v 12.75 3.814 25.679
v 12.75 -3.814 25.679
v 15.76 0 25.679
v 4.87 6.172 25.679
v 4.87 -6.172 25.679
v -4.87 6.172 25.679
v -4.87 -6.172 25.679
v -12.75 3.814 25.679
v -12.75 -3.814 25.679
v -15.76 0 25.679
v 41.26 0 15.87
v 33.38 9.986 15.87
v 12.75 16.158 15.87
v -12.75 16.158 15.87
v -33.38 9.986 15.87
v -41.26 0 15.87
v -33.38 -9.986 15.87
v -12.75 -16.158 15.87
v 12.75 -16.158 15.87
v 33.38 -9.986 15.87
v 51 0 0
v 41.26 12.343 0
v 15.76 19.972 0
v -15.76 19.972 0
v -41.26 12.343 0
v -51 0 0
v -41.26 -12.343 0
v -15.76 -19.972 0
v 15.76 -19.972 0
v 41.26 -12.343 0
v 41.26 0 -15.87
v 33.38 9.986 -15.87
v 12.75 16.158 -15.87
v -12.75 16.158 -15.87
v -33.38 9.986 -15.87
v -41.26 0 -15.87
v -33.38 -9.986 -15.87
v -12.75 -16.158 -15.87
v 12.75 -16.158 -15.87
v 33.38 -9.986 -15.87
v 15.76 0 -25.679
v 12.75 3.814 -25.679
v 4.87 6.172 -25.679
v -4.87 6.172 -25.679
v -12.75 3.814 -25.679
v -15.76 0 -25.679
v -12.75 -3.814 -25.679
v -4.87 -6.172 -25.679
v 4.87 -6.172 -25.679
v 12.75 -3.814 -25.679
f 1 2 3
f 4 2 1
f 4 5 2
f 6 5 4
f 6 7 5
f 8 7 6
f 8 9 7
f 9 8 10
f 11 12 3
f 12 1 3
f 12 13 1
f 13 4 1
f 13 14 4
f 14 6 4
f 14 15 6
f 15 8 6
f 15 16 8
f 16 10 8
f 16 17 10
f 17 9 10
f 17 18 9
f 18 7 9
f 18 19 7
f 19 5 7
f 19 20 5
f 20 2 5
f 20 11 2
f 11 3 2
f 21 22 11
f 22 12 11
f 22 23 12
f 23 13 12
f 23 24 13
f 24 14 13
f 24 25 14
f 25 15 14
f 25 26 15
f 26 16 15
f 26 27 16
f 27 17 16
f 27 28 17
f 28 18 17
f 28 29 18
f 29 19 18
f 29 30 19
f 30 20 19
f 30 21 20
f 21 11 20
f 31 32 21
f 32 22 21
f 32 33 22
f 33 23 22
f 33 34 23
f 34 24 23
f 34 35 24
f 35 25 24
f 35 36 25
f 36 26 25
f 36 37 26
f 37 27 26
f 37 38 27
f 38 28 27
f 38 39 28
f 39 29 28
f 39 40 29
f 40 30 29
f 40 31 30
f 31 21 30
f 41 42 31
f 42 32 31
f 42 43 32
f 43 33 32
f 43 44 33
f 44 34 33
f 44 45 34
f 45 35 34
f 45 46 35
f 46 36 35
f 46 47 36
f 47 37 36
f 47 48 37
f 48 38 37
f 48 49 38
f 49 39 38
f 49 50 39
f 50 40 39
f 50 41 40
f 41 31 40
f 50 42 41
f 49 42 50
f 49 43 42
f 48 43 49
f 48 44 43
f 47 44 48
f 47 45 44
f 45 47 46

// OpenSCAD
// Generated by SolidPython 1.0.1 on 2020-07-29 00:46:52


scale(v = [17, 7, 9]) {
	sphere(r = 3);
}
/***********************************************
*********      SolidPython code:      **********
************************************************
 
# import packages: SolidPython
from solid import *
from solid.utils import *
from itertools import chain, combinations, permutations


class Resize:

    def __init__(self, scad_file):
        self.scad_file = scad_file
        #self.scad_file = import_scad(scad_file)
        # cone/cylinder param:
        self.r1 = 0
        self.r2 = 0
        self.h = 0
        # rectangular prism param:
        self.w = 0
        self.l = 0
        # ellipse param:
        self.r = 0

    # import OpenScad code (file name corresponds to shape)


    # classify shape + parameters
    def assign(self, param1, param2, param3):
        if self.scad_file == 'cone.scad':
            self.r1 = param1
            self.r2 = param2
            self.h = param3
        elif self.scad_file == 'cylinder.scad':
            self.r1 = param1
            self.r2 = param2
            self.h = param3
        elif self.scad_file == 'rectangularPrism.scad':
            self.h = param1
            self.l = param2
            self.w = param3
        else:
            self.r = param1
            self.h = param2

    # resize parameters
    def iterate(self):
        x = range(3, 20, 2)
        i = 1
        if self.scad_file == 'cone.scad':
            tempList = list(permutations(x, 2))
            for temp in tempList:
                param1 = temp[0]
                param2 = temp[1]
                filepath = 'produced_scad_files/' + 'cone' + str(param1) + '_' + str(param2) + '_' + '.scad'
                scad_render_to_file(cylinder(h=param1, r1=param2, r2=0), filepath)

        elif self.scad_file == 'cylinder.scad':
            tempList = list(permutations(x, 3))
            for temp in tempList:
                param1 = temp[0]
                param2 = temp[1]
                filepath = 'produced_scad_files/' + 'cylinder' + str(param1) + '_' + str(param2) + '_' + '.scad'
                scad_render_to_file(cylinder(h=param1, r1=param2, r2=param2), filepath)

        elif self.scad_file == 'rectangularPrism.scad':
            tempList = list(permutations(x, 3))
            for temp in tempList:
                param1 = temp[0]
                param2 = temp[1]
                param3 = temp[2]
                filepath = 'produced_scad_files/' + 'rectangularPrism' + str(param1) + '_' + str(param2) + '_' + str(
                    param3) + '.scad'
                scad_render_to_file(cube(size=(param1, param2, param3)), filepath)

        elif self.scad_file == 'ellipse.scad':
            tempList = list(permutations(x, 4))
            for temp in tempList:
                param1 = temp[0]
                param2 = temp[1]
                param3 = temp[2]
                param4 = temp[3]
                filepath = 'produced_scad_files/' + 'ellipse' + str(param1) + '_' + str(param2) + '_' + str(param3) + '_' + str(param4) + '.scad'
                scad_render_to_file(scale([param1, param2, param3])(sphere(r=param4)), filepath)

    def render_to_scadfile(self):
        scad_render_to_file(scad, 'example.scad') 
 
************************************************/
